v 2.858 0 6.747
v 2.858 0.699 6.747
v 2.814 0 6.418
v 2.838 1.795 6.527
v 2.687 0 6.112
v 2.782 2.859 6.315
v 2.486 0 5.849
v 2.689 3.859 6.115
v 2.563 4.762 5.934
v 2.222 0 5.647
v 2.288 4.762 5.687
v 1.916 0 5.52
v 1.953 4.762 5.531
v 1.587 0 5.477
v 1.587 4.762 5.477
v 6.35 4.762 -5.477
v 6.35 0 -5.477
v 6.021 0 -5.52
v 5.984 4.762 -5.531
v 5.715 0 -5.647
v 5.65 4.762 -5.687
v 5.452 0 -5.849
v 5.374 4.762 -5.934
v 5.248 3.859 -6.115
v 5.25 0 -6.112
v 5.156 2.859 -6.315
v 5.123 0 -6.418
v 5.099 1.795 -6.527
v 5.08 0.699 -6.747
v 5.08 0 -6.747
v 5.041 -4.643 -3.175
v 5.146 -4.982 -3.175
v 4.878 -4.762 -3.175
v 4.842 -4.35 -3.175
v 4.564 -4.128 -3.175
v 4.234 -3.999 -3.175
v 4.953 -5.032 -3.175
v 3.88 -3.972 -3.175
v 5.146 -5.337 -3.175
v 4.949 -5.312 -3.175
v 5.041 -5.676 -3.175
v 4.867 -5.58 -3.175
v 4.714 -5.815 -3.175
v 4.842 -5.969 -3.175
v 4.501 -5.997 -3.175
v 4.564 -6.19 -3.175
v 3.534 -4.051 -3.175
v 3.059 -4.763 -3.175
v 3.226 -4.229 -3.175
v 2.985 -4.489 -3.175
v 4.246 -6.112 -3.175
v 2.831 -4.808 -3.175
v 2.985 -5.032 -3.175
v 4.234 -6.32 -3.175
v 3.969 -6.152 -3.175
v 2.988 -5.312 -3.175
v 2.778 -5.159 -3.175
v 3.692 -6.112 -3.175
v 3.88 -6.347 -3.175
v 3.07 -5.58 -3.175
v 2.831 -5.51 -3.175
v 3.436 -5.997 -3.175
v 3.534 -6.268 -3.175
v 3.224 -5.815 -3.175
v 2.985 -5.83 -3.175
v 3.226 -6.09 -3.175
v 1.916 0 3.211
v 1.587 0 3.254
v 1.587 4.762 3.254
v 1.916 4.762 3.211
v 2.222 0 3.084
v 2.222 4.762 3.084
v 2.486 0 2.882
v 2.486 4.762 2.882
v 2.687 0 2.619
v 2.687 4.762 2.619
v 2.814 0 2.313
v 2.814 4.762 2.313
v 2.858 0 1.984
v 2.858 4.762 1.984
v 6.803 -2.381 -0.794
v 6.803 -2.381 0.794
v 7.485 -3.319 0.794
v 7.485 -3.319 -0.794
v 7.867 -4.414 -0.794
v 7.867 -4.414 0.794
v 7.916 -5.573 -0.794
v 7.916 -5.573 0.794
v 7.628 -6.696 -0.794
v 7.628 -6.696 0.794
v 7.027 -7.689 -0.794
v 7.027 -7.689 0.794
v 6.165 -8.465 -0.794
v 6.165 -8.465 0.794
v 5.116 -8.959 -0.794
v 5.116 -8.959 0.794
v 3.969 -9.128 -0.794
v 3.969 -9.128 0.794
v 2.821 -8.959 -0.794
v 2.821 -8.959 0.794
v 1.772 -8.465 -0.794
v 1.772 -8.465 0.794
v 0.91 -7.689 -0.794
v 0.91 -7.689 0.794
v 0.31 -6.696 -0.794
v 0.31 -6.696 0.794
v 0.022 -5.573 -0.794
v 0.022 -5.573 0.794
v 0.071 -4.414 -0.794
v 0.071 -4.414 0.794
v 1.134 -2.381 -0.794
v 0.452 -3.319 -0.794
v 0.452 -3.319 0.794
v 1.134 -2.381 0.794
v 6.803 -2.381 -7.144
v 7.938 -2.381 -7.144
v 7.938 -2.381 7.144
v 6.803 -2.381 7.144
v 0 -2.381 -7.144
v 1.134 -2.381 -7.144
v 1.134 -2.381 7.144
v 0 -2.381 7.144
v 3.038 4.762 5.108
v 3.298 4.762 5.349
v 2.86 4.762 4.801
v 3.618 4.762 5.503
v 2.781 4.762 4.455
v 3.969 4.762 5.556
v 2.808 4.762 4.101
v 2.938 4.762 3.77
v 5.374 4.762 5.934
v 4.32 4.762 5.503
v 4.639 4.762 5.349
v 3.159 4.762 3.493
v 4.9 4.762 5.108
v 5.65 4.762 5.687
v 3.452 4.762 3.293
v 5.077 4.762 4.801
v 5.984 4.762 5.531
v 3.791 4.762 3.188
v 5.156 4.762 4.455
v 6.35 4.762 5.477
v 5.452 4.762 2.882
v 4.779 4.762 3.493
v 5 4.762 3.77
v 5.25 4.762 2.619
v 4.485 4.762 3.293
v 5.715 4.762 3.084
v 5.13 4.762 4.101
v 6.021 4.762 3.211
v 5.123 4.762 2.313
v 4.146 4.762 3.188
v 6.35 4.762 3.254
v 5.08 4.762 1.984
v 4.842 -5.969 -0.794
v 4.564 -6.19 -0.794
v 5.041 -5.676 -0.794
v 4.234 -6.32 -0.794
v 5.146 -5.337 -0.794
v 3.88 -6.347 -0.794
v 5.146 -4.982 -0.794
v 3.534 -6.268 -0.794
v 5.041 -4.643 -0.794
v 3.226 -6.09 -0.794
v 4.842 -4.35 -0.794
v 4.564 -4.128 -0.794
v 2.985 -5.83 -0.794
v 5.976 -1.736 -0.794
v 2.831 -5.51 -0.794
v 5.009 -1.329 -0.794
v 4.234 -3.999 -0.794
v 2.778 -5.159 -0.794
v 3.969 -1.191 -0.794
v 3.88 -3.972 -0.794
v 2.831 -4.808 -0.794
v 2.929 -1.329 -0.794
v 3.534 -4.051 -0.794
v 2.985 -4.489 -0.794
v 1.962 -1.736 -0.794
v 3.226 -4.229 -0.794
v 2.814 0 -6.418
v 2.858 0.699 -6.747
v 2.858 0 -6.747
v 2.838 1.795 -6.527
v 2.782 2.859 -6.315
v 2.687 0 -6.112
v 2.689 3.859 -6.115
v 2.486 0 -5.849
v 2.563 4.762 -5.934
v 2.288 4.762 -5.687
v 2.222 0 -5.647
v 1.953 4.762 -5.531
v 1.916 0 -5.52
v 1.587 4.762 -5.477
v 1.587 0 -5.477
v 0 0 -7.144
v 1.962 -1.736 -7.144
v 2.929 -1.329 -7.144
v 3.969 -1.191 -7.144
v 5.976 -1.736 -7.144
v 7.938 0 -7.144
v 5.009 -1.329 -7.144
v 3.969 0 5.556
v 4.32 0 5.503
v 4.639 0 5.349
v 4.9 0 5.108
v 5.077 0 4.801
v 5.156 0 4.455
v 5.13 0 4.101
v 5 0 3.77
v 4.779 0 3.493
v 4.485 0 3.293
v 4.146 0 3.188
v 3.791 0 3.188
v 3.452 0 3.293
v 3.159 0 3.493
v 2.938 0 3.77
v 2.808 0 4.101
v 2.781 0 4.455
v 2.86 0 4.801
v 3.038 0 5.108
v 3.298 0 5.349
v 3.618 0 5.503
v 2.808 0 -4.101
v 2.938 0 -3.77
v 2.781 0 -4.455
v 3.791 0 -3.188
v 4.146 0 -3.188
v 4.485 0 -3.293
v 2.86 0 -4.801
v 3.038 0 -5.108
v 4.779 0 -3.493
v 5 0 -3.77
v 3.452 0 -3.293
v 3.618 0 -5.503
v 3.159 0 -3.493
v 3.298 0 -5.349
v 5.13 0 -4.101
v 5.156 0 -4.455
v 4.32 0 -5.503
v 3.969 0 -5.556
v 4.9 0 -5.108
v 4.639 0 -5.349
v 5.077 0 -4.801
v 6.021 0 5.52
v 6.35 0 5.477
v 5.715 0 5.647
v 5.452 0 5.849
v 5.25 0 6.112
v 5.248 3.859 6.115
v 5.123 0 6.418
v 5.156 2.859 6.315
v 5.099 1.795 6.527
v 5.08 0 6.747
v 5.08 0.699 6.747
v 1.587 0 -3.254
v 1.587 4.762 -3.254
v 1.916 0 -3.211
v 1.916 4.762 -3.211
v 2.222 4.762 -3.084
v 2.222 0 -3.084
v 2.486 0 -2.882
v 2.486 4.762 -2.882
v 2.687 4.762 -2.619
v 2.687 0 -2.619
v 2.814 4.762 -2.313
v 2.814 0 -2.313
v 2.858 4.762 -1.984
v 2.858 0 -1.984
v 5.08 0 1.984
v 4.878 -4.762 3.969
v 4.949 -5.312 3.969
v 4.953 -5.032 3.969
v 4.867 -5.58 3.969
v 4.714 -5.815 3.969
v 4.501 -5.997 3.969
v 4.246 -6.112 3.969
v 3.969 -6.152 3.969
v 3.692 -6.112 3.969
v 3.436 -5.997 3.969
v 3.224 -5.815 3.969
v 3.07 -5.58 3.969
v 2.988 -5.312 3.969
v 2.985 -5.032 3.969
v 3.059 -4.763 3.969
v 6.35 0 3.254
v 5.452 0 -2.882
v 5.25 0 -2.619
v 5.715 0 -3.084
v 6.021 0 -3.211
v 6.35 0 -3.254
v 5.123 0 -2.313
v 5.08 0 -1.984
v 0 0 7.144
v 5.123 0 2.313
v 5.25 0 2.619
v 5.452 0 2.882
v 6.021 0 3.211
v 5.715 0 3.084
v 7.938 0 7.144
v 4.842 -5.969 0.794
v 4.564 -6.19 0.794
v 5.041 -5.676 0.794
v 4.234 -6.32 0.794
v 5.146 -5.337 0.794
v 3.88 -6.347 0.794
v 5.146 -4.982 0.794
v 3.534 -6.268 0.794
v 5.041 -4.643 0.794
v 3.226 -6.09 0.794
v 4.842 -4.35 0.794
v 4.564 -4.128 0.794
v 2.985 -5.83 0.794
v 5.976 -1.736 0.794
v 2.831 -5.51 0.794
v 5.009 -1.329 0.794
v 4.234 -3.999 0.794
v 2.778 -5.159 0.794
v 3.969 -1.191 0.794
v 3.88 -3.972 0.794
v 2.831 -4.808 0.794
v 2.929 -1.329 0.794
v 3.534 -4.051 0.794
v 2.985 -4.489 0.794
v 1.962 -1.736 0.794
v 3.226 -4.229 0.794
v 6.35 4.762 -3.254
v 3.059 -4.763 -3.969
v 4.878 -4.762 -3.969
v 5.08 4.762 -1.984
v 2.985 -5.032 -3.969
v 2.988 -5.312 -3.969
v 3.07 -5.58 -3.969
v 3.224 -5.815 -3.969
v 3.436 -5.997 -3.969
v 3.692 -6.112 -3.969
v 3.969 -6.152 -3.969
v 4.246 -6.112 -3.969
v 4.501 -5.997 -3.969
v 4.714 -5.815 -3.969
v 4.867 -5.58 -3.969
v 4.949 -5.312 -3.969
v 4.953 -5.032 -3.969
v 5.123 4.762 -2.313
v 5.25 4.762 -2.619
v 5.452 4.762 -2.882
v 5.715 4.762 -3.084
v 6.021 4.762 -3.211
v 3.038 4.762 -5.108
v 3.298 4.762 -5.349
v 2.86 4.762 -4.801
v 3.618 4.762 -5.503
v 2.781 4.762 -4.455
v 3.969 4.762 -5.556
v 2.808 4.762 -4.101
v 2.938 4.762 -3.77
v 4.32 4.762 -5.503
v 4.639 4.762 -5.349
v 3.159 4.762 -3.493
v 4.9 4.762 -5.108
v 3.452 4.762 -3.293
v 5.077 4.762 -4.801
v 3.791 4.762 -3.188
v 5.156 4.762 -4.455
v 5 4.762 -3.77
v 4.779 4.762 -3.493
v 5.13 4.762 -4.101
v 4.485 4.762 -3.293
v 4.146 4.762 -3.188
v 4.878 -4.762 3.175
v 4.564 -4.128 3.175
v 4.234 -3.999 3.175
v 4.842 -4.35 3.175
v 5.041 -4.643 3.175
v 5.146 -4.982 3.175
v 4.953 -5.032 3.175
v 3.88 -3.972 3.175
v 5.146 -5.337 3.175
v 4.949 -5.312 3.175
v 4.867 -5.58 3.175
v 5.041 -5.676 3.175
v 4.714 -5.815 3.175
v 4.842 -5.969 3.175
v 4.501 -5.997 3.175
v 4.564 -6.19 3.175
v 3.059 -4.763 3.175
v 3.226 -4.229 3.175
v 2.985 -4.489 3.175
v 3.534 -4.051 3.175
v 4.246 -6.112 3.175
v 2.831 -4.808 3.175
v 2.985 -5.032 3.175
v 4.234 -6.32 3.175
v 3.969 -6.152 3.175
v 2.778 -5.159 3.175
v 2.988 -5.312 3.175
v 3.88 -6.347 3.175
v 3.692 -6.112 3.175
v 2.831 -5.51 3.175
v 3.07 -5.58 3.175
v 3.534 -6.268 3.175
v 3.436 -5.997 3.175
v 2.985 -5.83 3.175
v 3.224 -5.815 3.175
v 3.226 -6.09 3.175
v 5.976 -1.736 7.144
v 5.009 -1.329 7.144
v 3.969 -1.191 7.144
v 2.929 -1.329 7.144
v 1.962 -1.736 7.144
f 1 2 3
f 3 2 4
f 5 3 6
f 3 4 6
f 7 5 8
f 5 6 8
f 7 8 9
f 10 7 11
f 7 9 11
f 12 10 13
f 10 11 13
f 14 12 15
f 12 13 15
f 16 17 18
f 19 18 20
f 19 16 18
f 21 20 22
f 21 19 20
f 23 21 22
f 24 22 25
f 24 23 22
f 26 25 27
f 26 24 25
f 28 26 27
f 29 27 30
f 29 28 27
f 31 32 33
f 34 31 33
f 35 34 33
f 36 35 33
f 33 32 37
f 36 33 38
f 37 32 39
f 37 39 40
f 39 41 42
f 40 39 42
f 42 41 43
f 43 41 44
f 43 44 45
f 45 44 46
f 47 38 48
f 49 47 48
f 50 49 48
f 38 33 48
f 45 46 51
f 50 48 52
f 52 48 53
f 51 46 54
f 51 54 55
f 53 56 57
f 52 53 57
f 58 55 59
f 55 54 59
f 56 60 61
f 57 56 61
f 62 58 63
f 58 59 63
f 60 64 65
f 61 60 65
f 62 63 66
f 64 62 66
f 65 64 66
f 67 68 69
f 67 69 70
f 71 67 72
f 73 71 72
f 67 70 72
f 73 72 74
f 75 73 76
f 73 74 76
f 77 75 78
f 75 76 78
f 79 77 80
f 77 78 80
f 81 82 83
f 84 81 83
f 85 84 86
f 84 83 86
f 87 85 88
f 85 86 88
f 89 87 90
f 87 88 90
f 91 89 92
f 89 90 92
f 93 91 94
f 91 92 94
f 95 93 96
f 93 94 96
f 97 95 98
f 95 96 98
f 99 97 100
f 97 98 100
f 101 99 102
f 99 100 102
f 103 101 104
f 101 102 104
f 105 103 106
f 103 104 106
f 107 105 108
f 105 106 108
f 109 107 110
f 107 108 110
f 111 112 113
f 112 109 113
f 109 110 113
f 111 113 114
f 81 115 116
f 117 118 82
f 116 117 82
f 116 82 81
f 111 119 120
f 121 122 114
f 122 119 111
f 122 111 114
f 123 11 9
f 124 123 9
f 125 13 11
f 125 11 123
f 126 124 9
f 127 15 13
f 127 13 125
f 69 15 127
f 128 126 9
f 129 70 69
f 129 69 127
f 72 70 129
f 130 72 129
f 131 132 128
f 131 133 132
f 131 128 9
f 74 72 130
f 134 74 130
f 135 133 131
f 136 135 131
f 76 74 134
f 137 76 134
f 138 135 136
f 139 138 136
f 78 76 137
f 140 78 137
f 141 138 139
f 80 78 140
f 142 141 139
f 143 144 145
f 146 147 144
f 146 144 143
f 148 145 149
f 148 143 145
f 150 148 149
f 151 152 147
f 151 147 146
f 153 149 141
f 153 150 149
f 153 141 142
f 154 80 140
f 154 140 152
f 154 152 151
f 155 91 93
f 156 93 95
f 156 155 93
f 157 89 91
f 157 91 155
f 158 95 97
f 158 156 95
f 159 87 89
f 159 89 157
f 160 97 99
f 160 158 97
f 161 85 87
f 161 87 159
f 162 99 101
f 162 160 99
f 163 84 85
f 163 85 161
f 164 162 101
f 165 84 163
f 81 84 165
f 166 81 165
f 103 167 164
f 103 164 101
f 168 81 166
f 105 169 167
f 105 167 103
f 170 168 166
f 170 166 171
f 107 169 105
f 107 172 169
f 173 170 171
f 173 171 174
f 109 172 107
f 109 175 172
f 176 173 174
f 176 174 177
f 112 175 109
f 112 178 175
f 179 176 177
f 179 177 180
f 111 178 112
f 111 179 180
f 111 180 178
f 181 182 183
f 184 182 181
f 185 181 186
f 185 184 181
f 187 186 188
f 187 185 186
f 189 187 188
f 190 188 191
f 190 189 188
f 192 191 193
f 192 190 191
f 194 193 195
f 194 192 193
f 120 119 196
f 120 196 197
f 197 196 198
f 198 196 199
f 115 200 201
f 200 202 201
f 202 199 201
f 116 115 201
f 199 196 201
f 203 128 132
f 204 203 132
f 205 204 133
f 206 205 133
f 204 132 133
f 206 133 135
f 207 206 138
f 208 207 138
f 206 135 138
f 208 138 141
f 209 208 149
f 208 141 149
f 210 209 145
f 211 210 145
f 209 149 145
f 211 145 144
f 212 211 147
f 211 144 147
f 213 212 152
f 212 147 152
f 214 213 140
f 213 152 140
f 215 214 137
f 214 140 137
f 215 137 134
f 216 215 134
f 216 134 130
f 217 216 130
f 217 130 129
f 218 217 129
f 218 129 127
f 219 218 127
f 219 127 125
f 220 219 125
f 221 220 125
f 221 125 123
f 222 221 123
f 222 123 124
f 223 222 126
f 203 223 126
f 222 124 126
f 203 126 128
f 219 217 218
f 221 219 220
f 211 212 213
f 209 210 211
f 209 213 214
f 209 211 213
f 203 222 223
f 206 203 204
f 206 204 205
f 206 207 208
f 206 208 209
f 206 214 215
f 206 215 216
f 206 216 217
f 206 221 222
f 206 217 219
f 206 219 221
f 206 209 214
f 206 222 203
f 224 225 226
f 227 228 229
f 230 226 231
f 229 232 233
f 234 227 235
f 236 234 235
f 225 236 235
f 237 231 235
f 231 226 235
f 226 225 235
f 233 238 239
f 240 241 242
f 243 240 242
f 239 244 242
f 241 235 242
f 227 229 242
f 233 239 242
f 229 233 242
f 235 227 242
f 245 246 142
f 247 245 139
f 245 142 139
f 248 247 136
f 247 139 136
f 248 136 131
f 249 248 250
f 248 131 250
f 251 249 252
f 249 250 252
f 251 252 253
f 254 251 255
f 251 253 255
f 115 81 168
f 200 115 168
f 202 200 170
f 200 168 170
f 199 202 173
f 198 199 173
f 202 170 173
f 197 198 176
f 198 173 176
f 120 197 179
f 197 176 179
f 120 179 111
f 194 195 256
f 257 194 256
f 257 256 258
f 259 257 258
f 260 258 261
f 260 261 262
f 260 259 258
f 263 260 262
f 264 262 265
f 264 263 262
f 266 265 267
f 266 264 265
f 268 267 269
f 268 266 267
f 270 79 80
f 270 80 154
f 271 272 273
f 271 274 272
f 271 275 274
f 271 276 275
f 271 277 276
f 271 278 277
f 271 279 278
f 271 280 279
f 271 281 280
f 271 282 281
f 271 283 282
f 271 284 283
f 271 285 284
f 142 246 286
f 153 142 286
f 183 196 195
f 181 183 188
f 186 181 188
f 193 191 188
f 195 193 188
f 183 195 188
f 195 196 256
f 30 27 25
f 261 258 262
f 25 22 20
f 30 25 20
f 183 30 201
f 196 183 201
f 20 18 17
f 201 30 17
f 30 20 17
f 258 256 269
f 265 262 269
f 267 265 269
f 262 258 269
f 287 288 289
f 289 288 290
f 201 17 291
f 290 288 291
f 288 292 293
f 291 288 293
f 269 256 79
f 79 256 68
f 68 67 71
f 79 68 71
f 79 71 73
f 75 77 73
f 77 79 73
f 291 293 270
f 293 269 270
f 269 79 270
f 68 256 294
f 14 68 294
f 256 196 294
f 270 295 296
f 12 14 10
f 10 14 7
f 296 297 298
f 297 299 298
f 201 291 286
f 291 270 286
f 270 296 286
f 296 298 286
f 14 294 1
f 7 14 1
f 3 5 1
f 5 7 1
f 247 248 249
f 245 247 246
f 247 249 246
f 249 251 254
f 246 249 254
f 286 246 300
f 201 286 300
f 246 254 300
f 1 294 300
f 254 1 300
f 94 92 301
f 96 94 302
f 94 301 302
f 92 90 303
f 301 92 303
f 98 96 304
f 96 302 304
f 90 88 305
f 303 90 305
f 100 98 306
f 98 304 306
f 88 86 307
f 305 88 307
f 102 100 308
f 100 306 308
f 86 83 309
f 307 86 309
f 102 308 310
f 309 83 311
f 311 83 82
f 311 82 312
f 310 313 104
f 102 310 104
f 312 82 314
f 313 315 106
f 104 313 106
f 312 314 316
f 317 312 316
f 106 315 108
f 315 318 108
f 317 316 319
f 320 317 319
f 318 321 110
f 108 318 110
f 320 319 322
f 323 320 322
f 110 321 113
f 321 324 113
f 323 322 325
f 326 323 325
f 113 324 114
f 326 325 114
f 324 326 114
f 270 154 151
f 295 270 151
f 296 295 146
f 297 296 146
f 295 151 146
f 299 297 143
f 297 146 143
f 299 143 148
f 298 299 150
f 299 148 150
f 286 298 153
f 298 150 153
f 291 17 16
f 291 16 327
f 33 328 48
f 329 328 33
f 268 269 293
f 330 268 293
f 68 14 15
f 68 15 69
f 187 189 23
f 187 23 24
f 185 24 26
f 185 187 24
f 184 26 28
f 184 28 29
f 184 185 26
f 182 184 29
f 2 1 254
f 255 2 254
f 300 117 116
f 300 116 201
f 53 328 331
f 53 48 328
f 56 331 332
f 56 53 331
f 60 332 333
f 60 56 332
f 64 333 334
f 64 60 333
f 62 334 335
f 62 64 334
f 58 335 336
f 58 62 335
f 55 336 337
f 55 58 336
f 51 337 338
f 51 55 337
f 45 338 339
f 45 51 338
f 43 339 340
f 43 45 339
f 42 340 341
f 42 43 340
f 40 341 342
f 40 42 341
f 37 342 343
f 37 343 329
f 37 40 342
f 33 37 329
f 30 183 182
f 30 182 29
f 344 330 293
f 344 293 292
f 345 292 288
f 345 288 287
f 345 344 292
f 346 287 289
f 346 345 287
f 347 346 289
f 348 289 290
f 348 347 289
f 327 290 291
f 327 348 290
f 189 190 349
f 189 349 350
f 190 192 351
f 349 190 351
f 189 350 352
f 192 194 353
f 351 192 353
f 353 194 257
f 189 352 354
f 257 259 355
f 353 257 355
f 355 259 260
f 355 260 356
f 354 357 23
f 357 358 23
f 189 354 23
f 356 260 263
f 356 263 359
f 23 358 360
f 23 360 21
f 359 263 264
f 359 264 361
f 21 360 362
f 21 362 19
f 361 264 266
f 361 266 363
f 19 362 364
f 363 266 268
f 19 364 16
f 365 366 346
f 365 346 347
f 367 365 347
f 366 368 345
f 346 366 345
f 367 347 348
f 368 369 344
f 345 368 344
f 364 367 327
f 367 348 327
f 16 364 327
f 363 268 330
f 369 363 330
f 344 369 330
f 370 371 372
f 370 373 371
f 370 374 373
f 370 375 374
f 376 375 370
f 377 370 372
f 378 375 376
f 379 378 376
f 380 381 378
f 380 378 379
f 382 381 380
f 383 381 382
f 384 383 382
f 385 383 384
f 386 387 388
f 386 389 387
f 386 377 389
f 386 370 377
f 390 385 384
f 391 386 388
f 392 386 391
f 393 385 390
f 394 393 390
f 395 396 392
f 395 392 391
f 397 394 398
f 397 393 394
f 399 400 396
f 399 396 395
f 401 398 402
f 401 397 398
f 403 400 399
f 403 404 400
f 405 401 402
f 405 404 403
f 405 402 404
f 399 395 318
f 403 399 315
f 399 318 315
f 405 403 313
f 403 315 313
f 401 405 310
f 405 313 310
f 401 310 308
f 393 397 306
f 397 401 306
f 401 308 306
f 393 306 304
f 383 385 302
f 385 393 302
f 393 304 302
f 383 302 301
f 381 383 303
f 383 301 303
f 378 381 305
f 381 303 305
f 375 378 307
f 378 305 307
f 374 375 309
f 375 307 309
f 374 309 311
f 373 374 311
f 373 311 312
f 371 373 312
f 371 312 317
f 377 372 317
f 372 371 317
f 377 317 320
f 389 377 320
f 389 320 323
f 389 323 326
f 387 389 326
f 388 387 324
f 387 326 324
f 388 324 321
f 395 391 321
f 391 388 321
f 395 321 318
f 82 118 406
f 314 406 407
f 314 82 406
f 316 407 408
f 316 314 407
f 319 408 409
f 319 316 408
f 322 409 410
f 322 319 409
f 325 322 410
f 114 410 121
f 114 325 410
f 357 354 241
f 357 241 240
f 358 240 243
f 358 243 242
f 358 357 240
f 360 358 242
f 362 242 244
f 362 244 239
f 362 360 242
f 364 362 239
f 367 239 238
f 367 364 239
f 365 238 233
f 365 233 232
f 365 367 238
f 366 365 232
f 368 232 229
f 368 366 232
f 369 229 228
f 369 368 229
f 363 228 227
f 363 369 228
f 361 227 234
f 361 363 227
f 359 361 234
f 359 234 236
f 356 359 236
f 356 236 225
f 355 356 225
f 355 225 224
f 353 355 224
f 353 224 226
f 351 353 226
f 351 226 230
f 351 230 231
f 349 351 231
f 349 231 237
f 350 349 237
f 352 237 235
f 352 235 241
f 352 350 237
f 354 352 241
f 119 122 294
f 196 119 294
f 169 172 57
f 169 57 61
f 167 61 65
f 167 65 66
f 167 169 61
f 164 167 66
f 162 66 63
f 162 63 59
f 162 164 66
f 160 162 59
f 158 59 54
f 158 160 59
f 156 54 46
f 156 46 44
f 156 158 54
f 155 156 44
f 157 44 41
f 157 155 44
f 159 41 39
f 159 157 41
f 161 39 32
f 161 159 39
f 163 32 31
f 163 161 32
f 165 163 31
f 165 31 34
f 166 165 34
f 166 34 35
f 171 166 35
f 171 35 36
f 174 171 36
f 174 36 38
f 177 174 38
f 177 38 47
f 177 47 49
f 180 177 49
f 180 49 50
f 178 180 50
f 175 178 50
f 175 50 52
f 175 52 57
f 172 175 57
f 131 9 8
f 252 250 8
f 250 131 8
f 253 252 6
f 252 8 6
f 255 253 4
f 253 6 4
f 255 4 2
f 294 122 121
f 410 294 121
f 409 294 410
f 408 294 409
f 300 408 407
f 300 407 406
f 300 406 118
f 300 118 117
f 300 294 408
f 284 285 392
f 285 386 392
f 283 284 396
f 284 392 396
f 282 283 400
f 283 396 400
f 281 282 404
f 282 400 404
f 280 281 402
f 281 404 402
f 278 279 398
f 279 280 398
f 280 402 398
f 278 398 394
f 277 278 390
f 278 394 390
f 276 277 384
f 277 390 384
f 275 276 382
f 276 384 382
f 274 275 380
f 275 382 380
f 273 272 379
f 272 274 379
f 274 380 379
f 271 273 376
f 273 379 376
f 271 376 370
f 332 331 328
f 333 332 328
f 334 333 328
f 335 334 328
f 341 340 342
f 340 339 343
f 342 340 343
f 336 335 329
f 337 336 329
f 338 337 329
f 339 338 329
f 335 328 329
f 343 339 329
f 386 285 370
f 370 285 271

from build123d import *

# Parameters (mm, degrees)
SKETCH1_W           = 7.9375
SKETCH1_H           = 2.38125
BOSS_EXTRUDE1_DEPTH = 7.14375
SKETCH2_R           = 3.96875
BOSS_EXTRUDE2_DEPTH = 0.79375
SKETCH3_R           = 3.96875
CUT_EXTRUDE1_DEPTH  = 14.661957117
SKETCH4_W           = 4.7625
SKETCH4_H           = 4.7625
BOSS_EXTRUDE3_DEPTH = 4.7625
SKETCH5_R           = 1.27
SKETCH5_R_2         = 1.190625
CUT_EXTRUDE2_DEPTH  = 4.7625
CUT_EXTRUDE3_DEPTH  = 14.216592983
SKETCH7_R           = 1.190625
BOSS_EXTRUDE4_DEPTH = 2.38125
SKETCH8_R           = 0.9921875
BOSS_EXTRUDE5_DEPTH = 0.79375
SKETCH9_W           = 2.032
SKETCH9_H           = 0.79375
CUT_EXTRUDE4_DEPTH  = 0.79375


with BuildPart() as part:
    # Sketch1 → Boss-Extrude1 (new body)
    with BuildSketch(Plane.XY):
        with Locations((3.96875, -1.190625)):
            Rectangle(SKETCH1_W, SKETCH1_H)
    boss_extrude1 = extrude(amount=BOSS_EXTRUDE1_DEPTH)

    # Sketch2 → Boss-Extrude2 (add)
    with BuildSketch(Plane(origin=(0, 0, 0), x_dir=(-1, 0, 0), z_dir=(0, 0, -1))):
        with Locations((-3.96875, -5.159375)):
            Circle(SKETCH2_R)
    boss_extrude2 = extrude(amount=-BOSS_EXTRUDE2_DEPTH)

    # Sketch3 → Cut-Extrude1 (cut, through all)
    with BuildSketch(Plane.XY.offset(0.79375)):
        with Locations((3.96875, -5.159375)):
            Circle(SKETCH3_R)
    cut_extrude1 = extrude(amount=CUT_EXTRUDE1_DEPTH, mode=Mode.SUBTRACT)

    # Sketch4 → Boss-Extrude3 (add)
    with BuildSketch(Plane(origin=(0, 0, 0), x_dir=(1, 0, 0), z_dir=(0, 1, 0))):
        with Locations((3.96875, -4.365625)):
            Rectangle(SKETCH4_W, SKETCH4_H)
    boss_extrude3 = extrude(amount=BOSS_EXTRUDE3_DEPTH)

    # Sketch5 → Cut-Extrude2 (cut)
    with BuildSketch(Plane(origin=(0, 4.7625, 0), x_dir=(1, 0, 0), z_dir=(0, 1, 0))):
        with Locations((1.5875, -6.746875)):
            Circle(SKETCH5_R)
        with Locations((1.5875, -1.984375)):
            Circle(SKETCH5_R)
        with Locations((6.35, -1.984375)):
            Circle(SKETCH5_R)
        with Locations((6.35, -6.746875)):
            Circle(SKETCH5_R)
        with Locations(Location((3.96875, -4.365625, 0), (0, 0, 270))):
            Circle(SKETCH5_R_2)
    cut_extrude2 = extrude(amount=-CUT_EXTRUDE2_DEPTH, mode=Mode.SUBTRACT)

    # Sketch6 → Cut-Extrude3 (cut, through all)
    with BuildSketch(Plane.ZY.offset(-1.5875)):
        Polygon((6.746875, 0.6985), (6.746875, 5.7785), (5.730875, 5.7785), align=None)
    cut_extrude3 = extrude(amount=-CUT_EXTRUDE3_DEPTH, mode=Mode.SUBTRACT)

    # Sketch7 → Boss-Extrude4 (add)
    with BuildSketch(Plane.XY.offset(0.79375)):
        with Locations(Location((3.96875, -5.159375, 0), (0, 0, 180))):
            Circle(SKETCH7_R)
    boss_extrude4 = extrude(amount=BOSS_EXTRUDE4_DEPTH)

    # Sketch8 → Boss-Extrude5 (add)
    with BuildSketch(Plane.XY.offset(3.175)):
        with Locations((3.96875, -5.159375)):
            Circle(SKETCH8_R)
    boss_extrude5 = extrude(amount=BOSS_EXTRUDE5_DEPTH)

    # Sketch9 → Cut-Extrude4 (cut)
    with BuildSketch(Plane.XY.offset(3.96875)):
        with Locations((3.96875, -4.365625)):
            Rectangle(SKETCH9_W, SKETCH9_H)
    cut_extrude4 = extrude(amount=-CUT_EXTRUDE4_DEPTH, mode=Mode.SUBTRACT)

    # Mirror1: Boss-Extrude1, Boss-Extrude2, Cut-Extrude1, Boss-Extrude3, Cut-Extrude2, Cut-Extrude3, Boss-Extrude4, Boss-Extrude5, Cut-Extrude4 across plane
    add(boss_extrude1.mirror(Plane.XY))
    add(boss_extrude2.mirror(Plane.XY))
    add(cut_extrude1.mirror(Plane.XY), mode=Mode.SUBTRACT)
    add(boss_extrude3.mirror(Plane.XY))
    add(cut_extrude2.mirror(Plane.XY), mode=Mode.SUBTRACT)
    add(cut_extrude3.mirror(Plane.XY), mode=Mode.SUBTRACT)
    add(boss_extrude4.mirror(Plane.XY))
    add(boss_extrude5.mirror(Plane.XY))
    add(cut_extrude4.mirror(Plane.XY), mode=Mode.SUBTRACT)


solid = part.part
